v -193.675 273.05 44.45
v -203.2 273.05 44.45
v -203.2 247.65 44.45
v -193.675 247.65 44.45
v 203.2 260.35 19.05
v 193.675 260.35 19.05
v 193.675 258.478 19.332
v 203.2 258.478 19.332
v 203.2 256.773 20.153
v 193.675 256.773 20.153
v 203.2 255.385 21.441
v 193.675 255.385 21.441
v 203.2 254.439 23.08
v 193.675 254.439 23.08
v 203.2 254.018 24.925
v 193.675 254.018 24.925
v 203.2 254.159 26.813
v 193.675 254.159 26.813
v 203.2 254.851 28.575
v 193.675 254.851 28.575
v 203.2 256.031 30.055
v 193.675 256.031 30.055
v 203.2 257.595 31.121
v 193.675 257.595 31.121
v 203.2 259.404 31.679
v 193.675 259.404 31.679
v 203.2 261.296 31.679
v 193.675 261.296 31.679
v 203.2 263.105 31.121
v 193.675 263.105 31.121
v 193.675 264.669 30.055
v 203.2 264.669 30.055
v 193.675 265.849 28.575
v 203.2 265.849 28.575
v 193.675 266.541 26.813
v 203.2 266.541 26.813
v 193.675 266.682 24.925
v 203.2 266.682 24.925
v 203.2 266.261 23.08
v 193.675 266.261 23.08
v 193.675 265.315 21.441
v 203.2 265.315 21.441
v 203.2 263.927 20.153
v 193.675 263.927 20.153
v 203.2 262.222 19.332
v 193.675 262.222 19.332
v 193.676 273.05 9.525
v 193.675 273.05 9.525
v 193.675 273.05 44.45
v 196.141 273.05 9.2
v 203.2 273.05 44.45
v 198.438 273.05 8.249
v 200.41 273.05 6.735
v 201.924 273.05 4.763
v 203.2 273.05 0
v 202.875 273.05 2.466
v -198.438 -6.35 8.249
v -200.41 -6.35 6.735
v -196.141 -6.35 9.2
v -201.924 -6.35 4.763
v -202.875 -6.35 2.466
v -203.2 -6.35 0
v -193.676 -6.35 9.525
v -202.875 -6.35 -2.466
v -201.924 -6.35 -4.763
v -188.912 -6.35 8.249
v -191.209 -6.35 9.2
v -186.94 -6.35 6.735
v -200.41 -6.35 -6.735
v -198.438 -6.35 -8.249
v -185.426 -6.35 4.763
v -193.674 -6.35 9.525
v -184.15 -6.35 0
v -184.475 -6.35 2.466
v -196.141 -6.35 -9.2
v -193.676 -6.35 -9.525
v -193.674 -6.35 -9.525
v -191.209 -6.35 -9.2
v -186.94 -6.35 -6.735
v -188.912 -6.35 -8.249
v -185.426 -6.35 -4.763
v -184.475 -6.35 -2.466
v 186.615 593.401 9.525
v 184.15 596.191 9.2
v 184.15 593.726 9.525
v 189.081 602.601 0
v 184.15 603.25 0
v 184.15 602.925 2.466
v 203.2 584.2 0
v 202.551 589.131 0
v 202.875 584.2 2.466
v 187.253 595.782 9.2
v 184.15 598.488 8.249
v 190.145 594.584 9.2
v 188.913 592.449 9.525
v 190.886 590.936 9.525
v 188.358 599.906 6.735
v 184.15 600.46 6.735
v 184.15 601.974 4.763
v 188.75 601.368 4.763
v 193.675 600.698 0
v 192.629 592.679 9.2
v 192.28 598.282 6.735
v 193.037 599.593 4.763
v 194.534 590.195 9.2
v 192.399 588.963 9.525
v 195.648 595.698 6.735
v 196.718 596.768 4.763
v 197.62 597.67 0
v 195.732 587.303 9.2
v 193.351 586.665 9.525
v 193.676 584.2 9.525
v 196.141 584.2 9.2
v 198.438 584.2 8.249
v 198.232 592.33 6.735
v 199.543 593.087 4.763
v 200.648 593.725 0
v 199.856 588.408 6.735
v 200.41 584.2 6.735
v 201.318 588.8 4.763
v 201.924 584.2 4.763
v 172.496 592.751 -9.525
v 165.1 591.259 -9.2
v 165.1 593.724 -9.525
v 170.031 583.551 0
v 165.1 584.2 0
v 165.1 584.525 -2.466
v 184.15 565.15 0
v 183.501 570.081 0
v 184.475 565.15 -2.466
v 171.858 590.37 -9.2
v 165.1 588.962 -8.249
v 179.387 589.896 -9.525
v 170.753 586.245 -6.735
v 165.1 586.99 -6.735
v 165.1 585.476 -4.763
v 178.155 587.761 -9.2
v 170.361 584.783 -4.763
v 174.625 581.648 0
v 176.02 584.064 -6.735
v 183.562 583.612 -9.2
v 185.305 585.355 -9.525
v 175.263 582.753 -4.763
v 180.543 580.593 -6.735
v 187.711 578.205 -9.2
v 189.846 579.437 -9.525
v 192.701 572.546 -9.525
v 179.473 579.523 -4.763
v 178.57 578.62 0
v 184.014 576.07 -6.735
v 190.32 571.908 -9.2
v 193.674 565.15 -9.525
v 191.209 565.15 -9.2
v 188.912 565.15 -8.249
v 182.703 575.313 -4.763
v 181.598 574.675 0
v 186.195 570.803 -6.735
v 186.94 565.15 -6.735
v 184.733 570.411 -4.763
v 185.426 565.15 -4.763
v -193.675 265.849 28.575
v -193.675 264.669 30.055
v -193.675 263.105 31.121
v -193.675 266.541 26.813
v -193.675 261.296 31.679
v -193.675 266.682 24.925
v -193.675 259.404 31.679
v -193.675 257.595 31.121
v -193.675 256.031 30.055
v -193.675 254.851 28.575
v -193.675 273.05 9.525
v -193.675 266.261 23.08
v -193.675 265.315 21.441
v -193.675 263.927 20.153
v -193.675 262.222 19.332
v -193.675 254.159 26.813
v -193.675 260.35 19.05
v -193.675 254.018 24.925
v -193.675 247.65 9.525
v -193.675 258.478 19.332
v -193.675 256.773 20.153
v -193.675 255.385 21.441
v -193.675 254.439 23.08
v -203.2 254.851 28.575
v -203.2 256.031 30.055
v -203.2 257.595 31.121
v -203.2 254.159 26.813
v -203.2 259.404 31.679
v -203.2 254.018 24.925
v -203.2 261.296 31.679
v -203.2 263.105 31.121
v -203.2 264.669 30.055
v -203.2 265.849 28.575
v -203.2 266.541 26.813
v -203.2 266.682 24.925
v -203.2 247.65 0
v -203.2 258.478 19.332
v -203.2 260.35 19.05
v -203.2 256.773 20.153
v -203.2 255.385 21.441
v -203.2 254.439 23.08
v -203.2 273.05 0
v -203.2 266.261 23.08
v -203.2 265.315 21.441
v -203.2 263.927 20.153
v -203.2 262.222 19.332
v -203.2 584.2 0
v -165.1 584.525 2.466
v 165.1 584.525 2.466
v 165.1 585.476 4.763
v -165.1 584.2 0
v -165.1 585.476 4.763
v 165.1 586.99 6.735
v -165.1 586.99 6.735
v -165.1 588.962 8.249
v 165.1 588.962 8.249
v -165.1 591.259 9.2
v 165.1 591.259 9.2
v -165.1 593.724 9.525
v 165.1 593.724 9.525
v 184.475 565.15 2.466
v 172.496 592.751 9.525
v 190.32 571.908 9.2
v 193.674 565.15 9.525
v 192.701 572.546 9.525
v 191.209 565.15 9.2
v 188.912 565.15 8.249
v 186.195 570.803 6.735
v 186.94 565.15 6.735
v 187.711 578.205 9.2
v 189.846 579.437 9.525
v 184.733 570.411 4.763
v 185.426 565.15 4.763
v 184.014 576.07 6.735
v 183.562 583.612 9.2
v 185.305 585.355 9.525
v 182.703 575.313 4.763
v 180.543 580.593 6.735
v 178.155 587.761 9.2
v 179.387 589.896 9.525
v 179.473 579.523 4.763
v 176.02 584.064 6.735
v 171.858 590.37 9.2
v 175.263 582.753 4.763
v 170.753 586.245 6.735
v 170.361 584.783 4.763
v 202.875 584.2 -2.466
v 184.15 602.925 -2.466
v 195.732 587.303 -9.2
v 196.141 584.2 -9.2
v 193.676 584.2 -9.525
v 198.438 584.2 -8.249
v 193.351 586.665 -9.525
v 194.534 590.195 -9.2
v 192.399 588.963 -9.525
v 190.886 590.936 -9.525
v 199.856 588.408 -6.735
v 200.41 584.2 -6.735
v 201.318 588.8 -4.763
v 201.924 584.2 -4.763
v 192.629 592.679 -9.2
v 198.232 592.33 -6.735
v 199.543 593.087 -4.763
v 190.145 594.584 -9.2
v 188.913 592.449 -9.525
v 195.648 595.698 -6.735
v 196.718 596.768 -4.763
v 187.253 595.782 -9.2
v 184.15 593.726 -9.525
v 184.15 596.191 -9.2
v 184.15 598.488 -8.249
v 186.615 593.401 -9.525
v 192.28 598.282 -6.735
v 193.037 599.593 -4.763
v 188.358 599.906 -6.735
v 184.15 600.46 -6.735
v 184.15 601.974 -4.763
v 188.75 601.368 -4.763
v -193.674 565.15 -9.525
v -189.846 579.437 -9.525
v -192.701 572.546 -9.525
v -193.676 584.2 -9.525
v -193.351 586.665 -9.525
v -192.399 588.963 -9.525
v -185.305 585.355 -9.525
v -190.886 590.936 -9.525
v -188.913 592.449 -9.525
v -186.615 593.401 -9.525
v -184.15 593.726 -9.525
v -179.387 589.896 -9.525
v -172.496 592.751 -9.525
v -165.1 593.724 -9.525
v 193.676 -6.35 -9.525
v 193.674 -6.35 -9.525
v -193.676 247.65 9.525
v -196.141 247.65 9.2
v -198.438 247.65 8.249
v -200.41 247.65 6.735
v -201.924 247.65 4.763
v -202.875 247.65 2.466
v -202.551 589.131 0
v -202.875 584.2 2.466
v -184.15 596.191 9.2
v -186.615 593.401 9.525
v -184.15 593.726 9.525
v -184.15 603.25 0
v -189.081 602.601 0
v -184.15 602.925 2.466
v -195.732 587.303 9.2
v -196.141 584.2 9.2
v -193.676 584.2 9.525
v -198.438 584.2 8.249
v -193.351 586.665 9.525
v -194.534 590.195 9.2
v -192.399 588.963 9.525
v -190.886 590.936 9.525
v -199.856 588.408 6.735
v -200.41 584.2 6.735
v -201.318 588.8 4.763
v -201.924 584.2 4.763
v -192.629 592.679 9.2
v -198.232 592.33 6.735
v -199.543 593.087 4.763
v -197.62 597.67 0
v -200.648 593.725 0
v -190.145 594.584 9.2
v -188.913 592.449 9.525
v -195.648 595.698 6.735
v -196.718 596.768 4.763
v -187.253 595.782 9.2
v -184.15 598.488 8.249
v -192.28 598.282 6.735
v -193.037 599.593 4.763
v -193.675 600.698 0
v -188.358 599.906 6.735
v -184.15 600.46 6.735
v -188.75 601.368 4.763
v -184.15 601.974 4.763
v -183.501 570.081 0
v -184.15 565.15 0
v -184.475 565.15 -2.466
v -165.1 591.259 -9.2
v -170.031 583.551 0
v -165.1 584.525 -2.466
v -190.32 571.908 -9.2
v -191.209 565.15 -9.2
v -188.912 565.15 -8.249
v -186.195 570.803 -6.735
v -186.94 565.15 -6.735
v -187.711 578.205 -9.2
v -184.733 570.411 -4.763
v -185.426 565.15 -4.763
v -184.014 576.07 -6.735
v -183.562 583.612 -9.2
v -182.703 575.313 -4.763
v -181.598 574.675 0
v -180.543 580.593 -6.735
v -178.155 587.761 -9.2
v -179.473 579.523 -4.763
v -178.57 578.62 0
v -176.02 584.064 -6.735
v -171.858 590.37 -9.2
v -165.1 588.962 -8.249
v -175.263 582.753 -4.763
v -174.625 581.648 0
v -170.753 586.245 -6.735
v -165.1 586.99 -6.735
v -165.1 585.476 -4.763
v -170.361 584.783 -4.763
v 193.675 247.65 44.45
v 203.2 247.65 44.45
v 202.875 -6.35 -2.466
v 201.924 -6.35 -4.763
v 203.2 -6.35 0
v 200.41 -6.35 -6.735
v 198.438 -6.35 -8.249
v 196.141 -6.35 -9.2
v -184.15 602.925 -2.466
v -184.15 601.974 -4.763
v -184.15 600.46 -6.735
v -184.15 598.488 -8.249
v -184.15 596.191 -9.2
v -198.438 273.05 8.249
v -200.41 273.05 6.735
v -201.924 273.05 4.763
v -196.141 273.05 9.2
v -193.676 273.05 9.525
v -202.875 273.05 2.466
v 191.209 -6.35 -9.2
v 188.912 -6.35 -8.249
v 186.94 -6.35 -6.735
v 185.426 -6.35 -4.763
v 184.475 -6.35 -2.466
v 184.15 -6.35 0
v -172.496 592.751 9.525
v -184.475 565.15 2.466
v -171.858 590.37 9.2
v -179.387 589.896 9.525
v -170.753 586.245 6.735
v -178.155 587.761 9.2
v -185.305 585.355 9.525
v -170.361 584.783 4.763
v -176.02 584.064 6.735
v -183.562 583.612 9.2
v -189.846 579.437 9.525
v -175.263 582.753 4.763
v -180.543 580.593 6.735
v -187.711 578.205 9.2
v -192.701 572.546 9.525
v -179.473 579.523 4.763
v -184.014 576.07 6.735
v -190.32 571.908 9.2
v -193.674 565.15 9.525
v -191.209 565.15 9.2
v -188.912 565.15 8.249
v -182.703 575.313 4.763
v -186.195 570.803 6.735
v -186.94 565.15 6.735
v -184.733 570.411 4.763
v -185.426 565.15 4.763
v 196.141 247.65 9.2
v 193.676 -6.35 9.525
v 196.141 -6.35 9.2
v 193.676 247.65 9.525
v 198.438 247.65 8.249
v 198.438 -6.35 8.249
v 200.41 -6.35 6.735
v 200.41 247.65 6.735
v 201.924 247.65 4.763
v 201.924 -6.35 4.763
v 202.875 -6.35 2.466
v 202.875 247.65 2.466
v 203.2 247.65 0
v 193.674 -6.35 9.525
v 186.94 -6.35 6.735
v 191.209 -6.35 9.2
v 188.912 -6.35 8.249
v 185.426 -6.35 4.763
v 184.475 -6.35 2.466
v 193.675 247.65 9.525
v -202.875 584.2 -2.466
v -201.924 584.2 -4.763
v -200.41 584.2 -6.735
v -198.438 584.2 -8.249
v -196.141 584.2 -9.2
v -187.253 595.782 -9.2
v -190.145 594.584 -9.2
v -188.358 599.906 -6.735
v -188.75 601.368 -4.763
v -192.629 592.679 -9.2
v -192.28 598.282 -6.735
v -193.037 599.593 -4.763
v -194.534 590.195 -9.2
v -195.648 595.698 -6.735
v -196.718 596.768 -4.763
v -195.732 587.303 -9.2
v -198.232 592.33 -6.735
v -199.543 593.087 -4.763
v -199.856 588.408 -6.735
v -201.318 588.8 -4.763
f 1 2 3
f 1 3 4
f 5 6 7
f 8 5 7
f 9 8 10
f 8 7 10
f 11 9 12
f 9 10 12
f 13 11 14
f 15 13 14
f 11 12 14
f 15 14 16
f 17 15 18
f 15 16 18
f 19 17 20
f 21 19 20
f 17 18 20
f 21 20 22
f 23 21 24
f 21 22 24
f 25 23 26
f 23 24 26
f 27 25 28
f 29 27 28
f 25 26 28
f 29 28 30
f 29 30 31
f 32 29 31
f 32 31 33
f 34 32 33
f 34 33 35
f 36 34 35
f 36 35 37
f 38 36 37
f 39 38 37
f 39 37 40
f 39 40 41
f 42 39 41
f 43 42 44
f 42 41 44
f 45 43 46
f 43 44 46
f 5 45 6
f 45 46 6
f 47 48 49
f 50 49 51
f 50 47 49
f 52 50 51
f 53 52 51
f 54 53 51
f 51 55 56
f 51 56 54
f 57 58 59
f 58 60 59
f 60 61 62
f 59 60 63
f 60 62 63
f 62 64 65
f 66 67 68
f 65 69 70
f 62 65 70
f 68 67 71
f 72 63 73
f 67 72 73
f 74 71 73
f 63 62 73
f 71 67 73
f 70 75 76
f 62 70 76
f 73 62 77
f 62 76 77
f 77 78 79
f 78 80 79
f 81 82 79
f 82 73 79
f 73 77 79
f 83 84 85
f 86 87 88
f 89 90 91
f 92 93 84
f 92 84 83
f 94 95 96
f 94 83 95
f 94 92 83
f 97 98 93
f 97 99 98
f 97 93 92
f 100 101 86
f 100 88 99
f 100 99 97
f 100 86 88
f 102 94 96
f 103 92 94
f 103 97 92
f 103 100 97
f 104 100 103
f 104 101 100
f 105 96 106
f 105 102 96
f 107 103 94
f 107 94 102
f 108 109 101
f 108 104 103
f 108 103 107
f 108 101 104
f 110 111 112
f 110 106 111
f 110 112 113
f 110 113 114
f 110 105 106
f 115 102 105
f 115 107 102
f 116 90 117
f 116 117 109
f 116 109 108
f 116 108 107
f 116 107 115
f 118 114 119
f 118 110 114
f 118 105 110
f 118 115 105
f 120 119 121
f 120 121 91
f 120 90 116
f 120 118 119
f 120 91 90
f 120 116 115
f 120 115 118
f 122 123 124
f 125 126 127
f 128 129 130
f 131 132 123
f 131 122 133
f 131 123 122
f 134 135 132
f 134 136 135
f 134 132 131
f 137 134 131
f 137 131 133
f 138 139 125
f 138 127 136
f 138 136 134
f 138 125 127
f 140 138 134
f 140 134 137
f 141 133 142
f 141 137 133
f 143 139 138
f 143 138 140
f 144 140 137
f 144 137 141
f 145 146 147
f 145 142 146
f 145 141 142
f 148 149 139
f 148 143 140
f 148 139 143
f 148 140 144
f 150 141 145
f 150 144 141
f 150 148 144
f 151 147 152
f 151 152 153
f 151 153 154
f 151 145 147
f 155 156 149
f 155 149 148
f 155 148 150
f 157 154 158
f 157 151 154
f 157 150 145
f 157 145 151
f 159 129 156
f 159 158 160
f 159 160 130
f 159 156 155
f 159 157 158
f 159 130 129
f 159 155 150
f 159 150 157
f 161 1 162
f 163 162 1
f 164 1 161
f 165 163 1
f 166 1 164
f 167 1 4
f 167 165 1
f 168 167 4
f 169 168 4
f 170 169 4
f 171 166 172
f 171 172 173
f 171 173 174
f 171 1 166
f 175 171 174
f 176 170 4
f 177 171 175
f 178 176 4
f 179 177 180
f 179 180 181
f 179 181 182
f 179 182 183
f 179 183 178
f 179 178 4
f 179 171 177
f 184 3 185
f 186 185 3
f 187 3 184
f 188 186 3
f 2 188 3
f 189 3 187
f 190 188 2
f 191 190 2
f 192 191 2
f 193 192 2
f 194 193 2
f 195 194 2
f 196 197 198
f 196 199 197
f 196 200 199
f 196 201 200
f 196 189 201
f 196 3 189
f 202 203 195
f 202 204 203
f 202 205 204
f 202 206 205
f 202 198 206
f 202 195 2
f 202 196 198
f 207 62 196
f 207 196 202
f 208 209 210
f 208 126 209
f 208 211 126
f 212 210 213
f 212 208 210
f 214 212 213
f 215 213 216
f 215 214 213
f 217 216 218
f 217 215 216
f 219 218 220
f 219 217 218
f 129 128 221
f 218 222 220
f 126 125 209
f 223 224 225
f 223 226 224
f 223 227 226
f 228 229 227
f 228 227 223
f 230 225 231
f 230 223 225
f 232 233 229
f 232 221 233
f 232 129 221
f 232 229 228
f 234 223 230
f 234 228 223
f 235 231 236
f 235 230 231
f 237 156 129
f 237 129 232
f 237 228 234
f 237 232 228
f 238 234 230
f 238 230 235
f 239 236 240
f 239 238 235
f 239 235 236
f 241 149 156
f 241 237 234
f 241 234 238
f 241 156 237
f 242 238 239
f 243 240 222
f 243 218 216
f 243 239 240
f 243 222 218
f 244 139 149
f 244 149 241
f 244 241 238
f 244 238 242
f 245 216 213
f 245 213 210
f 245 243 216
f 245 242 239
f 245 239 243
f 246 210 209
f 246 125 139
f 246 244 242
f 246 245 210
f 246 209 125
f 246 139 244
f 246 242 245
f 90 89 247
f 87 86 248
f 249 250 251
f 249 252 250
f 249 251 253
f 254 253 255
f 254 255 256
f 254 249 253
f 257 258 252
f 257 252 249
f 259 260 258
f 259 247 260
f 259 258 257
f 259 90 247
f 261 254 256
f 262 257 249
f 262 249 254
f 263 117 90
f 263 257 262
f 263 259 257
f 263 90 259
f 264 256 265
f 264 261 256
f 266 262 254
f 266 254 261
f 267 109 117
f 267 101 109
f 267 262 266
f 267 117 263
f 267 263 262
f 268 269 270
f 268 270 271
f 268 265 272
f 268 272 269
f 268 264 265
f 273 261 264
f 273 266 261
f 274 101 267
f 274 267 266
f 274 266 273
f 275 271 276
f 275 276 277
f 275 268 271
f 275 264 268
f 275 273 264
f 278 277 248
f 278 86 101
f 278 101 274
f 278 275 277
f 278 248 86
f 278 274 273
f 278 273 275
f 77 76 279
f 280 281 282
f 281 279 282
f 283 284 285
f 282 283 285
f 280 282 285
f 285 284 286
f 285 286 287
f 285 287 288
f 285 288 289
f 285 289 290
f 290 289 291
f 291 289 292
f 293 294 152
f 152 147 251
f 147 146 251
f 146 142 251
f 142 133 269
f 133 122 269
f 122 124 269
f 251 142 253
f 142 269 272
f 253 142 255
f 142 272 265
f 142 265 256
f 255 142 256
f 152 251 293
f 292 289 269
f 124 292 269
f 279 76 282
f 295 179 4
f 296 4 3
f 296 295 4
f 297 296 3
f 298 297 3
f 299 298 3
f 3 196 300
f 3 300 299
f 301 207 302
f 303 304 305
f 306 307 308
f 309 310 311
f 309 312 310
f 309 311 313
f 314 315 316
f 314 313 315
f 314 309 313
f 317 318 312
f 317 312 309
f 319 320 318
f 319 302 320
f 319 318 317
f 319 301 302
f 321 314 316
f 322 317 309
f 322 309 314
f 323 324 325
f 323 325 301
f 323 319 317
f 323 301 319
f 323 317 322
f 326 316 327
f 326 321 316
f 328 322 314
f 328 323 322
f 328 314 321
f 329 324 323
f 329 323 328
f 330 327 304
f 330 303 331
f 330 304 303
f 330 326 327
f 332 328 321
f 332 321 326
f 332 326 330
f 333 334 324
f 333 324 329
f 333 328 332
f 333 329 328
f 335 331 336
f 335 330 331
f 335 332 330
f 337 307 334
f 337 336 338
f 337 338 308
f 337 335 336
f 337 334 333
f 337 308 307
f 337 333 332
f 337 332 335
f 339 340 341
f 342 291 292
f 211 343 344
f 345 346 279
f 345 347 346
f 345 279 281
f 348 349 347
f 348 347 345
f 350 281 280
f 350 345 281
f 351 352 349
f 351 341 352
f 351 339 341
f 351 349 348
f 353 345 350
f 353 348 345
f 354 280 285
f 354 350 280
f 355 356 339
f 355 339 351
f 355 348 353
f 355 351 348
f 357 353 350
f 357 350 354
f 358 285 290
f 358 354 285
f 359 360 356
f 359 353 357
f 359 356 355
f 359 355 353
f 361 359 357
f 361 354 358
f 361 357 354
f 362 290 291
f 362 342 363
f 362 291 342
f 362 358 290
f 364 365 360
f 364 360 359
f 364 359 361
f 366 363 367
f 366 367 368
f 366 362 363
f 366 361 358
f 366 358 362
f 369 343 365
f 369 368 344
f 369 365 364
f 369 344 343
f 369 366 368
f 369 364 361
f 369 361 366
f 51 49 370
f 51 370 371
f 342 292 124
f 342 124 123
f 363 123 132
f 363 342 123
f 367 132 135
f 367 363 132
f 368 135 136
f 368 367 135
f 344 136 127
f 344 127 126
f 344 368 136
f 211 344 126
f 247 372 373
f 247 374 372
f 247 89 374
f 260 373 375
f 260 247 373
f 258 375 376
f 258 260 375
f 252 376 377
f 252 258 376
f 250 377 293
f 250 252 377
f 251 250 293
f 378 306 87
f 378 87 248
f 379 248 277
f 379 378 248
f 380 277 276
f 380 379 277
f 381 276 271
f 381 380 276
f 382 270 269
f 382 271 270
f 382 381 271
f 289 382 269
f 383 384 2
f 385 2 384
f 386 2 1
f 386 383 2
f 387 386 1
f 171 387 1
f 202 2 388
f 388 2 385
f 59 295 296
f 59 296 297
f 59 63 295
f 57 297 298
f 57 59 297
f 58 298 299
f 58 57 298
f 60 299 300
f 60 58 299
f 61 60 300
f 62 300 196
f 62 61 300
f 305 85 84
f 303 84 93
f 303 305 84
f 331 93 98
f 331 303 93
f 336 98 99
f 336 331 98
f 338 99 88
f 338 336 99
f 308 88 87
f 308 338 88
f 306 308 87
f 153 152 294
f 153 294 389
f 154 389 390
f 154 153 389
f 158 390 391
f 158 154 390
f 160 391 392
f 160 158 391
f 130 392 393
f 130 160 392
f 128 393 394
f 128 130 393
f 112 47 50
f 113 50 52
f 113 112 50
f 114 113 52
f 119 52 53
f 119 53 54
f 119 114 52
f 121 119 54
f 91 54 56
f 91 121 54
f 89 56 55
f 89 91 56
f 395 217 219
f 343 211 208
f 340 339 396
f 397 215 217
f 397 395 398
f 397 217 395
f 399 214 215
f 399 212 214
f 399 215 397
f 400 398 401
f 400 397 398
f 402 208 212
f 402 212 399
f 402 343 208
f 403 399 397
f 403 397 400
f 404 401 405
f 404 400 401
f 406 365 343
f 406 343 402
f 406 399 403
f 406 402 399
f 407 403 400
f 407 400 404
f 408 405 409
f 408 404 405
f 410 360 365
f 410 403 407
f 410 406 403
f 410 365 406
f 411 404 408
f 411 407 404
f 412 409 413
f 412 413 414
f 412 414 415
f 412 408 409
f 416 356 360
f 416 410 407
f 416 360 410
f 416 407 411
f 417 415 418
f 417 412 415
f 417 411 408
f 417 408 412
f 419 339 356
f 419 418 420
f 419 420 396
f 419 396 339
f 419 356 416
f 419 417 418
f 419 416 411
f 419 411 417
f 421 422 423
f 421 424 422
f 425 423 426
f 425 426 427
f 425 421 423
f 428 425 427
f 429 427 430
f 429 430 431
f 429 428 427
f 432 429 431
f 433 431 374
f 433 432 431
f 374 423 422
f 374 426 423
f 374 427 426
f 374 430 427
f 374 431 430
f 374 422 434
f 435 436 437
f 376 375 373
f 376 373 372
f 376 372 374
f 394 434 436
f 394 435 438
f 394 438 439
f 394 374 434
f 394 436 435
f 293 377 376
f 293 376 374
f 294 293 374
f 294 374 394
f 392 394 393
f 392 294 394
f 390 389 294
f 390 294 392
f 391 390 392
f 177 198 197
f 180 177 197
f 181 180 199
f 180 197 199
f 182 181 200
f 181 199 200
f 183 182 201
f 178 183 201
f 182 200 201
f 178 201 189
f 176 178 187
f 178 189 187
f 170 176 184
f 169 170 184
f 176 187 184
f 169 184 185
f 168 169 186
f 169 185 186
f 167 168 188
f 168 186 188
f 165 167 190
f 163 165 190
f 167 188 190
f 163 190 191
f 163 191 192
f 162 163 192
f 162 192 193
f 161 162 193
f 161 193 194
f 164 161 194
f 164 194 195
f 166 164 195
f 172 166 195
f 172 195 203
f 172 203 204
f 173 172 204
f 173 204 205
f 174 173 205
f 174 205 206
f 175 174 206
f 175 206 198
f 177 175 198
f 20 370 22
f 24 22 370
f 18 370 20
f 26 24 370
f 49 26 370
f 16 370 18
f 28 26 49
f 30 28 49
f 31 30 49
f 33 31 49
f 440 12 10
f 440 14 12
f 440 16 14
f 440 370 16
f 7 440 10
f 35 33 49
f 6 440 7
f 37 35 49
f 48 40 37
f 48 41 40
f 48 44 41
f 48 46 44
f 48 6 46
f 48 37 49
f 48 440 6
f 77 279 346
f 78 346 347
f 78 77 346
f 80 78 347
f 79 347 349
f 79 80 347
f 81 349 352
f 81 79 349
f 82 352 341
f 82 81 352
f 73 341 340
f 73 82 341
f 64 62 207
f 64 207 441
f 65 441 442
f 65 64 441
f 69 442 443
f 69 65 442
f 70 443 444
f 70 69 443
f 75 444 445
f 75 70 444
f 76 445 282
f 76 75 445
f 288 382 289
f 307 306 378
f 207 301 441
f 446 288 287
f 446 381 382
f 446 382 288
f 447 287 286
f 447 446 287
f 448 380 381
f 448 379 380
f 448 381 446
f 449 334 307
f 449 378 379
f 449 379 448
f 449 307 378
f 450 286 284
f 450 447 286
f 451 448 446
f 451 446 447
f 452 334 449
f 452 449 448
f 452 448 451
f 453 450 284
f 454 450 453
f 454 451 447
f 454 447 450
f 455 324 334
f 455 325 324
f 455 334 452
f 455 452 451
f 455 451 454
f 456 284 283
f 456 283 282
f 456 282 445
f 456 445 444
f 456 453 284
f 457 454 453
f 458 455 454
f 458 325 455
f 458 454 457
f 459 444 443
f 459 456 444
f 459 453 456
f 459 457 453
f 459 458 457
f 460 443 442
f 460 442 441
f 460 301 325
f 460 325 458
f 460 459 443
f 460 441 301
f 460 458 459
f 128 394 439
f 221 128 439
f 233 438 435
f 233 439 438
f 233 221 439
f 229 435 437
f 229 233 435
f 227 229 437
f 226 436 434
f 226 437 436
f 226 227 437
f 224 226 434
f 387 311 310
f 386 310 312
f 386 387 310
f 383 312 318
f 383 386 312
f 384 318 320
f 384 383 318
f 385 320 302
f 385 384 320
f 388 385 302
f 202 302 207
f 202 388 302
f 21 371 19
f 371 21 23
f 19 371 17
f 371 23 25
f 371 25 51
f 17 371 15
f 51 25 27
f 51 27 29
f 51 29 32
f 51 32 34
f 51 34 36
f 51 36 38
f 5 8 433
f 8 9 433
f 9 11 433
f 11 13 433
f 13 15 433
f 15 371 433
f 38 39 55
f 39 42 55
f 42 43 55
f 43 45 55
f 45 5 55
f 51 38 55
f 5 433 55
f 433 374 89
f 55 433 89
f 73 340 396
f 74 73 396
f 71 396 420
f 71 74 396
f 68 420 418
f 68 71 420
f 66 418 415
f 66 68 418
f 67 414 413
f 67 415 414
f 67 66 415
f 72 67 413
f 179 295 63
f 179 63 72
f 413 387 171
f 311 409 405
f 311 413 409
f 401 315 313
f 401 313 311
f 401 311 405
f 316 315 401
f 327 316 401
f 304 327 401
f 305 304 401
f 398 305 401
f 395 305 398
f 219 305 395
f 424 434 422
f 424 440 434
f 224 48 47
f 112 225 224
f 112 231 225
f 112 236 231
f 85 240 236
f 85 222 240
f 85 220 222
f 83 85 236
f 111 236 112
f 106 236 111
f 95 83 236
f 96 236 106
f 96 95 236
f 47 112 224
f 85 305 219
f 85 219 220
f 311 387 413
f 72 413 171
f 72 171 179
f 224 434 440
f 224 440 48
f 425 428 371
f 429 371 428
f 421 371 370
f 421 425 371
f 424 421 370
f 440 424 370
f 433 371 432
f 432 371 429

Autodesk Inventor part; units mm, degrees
ref_plane "YZ Plane" through (0, 0, 0) normal (1, 0, 0) x (0, 1, 0)
ref_plane "XZ Plane" through (0, 0, 0) normal (0, 1, 0) x (-1, 0, 0)
ref_plane "XY Plane" through (0, 0, 0) normal (0, 0, 1) x (1, 0, 0)
sketch "Sketch1" plane through (0, 0, 0) normal (0, 0, 1) x (1, 0, 0)
  line L0 (-203.2, -6.35) -> (-203.2, 584.2)
  arc A0 (-184.15, 603.25) -> (-203.2, 584.2) centre (-184.15, 584.2) ccw
  line L1 (-184.15, -6.35) -> (-184.15, 565.15)
  arc A1 (-165.1, 584.2) -> (-184.15, 565.15) centre (-165.1, 565.15) ccw
  line L2 (-203.2, -6.35) -> (-184.15, -6.35)
  line L3 (203.2, -6.35) -> (203.2, 584.2)
  arc A2 (203.2, 584.2) -> (184.15, 603.25) centre (184.15, 584.2) ccw
  line L4 (184.15, -6.35) -> (184.15, 565.15)
  arc A3 (184.15, 565.15) -> (165.1, 584.2) centre (165.1, 565.15) ccw
  line L5 (203.2, -6.35) -> (184.15, -6.35)
  line L6 (165.1, 584.2) -> (-165.1, 584.2)
  line L7 (-184.15, 603.25) -> (184.15, 603.25)
  point P0 (0, 0)
  dimension "d7" = 406.4
  dimension "d31" = 609.6
  dimension "d32" = 609.6
  dimension "d33" = 19.05
extrude "Extrusion1" add sketch "Sketch1" along normal mid plane 19.05
fillet "Fillet1" radius 9.525 20 edges at (178.5704, 578.6204, 9.525) (0, 584.2, 9.525) (-178.5704, 578.6204, 9.525) (-184.15, 279.4, 9.525) (184.15, 279.4, 9.525) (197.6204, 597.6704, 9.525) (0, 603.25, 9.525) (-197.6204, 597.6704, 9.525) (-203.2, 288.925, 9.525) (203.2, 288.925, 9.525) (197.6204, 597.6704, -9.525) (0, 603.25, -9.525) (-197.6204, 597.6704, -9.525) (-203.2, 288.925, -9.525) (203.2, 288.925, -9.525) (178.5704, 578.6204, -9.525) (0, 584.2, -9.525) (-178.5704, 578.6204, -9.525) (-184.15, 279.4, -9.525) (184.15, 279.4, -9.525)
sketch "Sketch2" plane through (0, 0, 0) normal (0, 0, 1) x (1, 0, 0)
  line L0 (203.2, 584.2) -> (203.2, -6.35) projected
  line L1 (203.2, 247.65) -> (193.675, 247.65)
  line L2 (193.675, 247.65) -> (193.675, 273.05)
  line L3 (193.675, 273.05) -> (203.2, 273.05)
  line L4 (203.2, 273.05) -> (203.2, 247.65)
  line L5 (203.2, -6.35) -> (184.15, -6.35) projected
  line L6 (-203.2, -6.35) -> (-203.2, 584.2) projected
  line L7 (-203.2, 273.05) -> (-193.675, 273.05)
  line L8 (-193.675, 273.05) -> (-193.675, 247.65)
  line L9 (-193.675, 247.65) -> (-203.2, 247.65)
  line L10 (-203.2, 247.65) -> (-203.2, 273.05)
  line L11 (-184.15, -6.35) -> (-203.2, -6.35) projected
  point P0 (0, 0)
  dimension "d13" = 254
  dimension "d14" = 25.4
  dimension "d15" = 9.525
  dimension "d16" = 25.4
  dimension "d17" = 254
  dimension "d34" = 387.35
extrude "Extrusion2" add sketch "Sketch2" along normal blind 44.45
sketch "Sketch3" plane through (203.2, 247.65, 0) normal (1, 0, 0) x (0, 0, -1)
  line L0 (0, 25.4) -> (-44.45, 25.4) projected
  line L1 (-44.45, 0) -> (-44.45, 25.4) projected
  point P0 (0, -247.65)
  point P1 (-25.4, 12.7)
  dimension "d20" = 12.7
  dimension "d21" = 19.05
hole "Hole1" at (203.2, 260.35, 25.4) direction (-1, 0, 0) diameter 12.7 end through all
properties part number "support"
